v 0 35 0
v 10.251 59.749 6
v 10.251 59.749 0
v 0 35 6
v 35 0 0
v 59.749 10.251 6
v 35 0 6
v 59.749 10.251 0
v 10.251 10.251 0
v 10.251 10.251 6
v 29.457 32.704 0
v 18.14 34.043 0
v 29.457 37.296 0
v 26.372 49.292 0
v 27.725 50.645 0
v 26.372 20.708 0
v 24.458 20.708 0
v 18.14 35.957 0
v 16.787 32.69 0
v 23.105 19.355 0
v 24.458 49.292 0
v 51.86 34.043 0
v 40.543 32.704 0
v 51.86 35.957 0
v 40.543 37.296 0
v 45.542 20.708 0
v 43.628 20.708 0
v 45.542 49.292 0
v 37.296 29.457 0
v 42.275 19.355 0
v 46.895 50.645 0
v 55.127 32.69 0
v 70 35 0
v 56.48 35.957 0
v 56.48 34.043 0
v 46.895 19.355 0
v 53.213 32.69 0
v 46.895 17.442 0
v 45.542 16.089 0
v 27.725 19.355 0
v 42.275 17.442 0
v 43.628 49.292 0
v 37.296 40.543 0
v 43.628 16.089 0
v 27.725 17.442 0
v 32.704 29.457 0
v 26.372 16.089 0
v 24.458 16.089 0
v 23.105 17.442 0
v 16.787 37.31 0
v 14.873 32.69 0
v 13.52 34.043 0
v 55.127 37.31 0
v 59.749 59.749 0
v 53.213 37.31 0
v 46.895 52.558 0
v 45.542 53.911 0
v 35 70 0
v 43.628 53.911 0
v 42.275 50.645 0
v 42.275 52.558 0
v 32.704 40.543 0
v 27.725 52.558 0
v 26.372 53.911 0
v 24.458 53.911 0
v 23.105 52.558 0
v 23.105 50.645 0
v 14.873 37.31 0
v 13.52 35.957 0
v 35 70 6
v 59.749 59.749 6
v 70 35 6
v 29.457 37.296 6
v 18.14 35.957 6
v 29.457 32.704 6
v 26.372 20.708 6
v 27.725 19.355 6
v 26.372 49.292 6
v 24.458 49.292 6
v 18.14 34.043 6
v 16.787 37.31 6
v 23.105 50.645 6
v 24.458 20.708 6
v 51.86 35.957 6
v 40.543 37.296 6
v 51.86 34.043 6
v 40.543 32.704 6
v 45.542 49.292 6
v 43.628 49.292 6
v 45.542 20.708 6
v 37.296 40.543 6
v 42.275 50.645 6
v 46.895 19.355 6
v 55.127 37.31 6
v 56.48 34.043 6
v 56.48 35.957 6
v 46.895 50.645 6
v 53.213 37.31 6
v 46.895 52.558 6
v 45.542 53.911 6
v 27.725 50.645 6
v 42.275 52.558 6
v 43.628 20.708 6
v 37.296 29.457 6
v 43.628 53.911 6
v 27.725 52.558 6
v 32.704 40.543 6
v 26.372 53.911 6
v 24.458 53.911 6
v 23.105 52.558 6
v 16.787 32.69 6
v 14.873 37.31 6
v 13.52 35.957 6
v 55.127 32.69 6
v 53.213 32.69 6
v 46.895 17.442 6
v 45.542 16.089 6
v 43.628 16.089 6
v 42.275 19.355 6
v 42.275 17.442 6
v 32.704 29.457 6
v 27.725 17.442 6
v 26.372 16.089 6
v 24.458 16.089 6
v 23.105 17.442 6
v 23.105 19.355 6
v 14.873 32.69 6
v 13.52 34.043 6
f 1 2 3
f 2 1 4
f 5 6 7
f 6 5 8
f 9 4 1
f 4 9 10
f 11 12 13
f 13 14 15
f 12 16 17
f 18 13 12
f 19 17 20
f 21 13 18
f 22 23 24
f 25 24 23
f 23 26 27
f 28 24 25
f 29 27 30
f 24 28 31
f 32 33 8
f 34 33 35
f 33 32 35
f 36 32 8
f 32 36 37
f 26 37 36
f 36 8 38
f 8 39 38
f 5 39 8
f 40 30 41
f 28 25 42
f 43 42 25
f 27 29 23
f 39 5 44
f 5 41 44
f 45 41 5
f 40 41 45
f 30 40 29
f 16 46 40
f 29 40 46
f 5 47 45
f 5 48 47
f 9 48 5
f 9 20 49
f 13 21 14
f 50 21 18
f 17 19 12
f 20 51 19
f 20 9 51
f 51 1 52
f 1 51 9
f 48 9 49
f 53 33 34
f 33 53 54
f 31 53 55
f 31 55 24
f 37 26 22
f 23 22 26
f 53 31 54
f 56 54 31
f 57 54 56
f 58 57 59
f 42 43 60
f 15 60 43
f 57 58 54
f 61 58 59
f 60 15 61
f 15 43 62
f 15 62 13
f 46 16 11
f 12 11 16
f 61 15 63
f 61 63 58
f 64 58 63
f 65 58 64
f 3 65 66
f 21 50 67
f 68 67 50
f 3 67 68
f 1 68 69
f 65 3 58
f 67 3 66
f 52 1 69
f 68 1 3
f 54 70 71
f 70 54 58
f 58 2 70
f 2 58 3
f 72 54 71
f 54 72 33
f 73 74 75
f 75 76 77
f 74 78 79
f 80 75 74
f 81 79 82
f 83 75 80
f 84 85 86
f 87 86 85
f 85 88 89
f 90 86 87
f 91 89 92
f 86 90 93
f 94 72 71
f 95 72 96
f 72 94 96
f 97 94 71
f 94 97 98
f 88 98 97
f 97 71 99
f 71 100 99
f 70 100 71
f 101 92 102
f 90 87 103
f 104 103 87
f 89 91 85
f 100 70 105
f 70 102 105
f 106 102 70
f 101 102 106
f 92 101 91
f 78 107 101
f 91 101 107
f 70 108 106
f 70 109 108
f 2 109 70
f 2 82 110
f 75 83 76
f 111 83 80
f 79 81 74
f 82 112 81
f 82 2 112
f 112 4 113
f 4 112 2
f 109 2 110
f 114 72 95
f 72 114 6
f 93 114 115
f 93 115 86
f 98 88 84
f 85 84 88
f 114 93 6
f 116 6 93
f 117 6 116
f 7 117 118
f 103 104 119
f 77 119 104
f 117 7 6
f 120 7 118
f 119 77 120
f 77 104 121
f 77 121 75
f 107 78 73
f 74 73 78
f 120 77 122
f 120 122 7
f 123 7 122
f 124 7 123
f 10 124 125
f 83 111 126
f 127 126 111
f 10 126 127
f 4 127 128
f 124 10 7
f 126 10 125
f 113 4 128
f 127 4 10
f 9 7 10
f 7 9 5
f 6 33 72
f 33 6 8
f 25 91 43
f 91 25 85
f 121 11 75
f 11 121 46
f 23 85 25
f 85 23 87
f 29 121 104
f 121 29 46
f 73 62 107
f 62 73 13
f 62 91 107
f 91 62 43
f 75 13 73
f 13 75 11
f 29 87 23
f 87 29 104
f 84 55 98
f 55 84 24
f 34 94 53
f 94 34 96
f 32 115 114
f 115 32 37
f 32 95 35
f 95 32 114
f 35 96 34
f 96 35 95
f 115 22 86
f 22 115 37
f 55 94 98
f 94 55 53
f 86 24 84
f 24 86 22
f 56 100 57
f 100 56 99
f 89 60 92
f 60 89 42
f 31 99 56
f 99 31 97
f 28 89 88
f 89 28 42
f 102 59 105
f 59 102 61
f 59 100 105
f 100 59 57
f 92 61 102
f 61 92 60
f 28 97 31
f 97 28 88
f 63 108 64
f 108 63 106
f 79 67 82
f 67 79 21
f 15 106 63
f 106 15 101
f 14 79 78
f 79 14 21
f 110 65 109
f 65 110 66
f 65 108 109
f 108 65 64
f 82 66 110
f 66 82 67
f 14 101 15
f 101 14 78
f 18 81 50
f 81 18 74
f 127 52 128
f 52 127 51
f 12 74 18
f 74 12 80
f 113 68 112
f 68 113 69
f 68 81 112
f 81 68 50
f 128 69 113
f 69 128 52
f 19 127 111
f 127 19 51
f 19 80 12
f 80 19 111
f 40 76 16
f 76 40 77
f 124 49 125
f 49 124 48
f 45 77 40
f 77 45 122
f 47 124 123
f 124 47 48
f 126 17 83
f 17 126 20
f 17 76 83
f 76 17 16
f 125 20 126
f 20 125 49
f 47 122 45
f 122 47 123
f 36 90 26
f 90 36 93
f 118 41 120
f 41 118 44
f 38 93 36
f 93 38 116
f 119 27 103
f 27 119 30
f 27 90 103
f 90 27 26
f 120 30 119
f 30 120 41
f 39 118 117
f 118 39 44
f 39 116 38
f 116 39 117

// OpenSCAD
$fn = 32;

// ----------------------------------------------------------------------
// Polygon plate: 8-gon R35, 6 bolt windows
// ----------------------------------------------------------------------

// --- parameters (mm) ---
sides = 8;                // number of polygon sides
plate_r = 35;             // circumscribed radius of the polygon
bore_r = 6;               // centre bore radius
bolts = 6;                // number of bolt windows
ring_r = 19.17;           // bolt-circle radius
bolt_r = 2.5;             // bolt window radius
plate_t = 6;              // plate thickness, Z (extrusion height)

plate_d = 2 * plate_r;  // circumscribed diameter
bore_d = 2 * bore_r;  // centre bore diameter
bolt_d = 2 * bolt_r;  // bolt window diameter
ring_d = 2 * ring_r;  // bolt-circle diameter

profile = [[70, 35], [59.749, 59.749], [35, 70], [10.251, 59.749], [0, 35], [10.251, 10.251], [35, 0], [59.749, 10.251]];  // primary outline, 8 points, counter clockwise
void_1 = [[40.543, 37.296], [37.296, 40.543], [32.704, 40.543], [29.457, 37.296], [29.457, 32.704], [32.704, 29.457], [37.296, 29.457], [40.543, 32.704]];  // centre bore, 8 points
void_2 = [[56.48, 35.957], [55.127, 37.31], [53.213, 37.31], [51.86, 35.957], [51.86, 34.043], [53.213, 32.69], [55.127, 32.69], [56.48, 34.043]];  // bolt window 1, 8 points
void_3 = [[46.895, 52.558], [45.542, 53.911], [43.628, 53.911], [42.275, 52.558], [42.275, 50.645], [43.628, 49.292], [45.542, 49.292], [46.895, 50.645]];  // bolt window 2, 8 points
void_4 = [[27.725, 52.558], [26.372, 53.911], [24.458, 53.911], [23.105, 52.558], [23.105, 50.645], [24.458, 49.292], [26.372, 49.292], [27.725, 50.645]];  // bolt window 3, 8 points
void_5 = [[18.14, 35.957], [16.787, 37.31], [14.873, 37.31], [13.52, 35.957], [13.52, 34.043], [14.873, 32.69], [16.787, 32.69], [18.14, 34.043]];  // bolt window 4, 8 points
void_6 = [[27.725, 19.355], [26.372, 20.708], [24.458, 20.708], [23.105, 19.355], [23.105, 17.442], [24.458, 16.089], [26.372, 16.089], [27.725, 17.442]];  // bolt window 5, 8 points
void_7 = [[46.895, 19.355], [45.542, 20.708], [43.628, 20.708], [42.275, 19.355], [42.275, 17.442], [43.628, 16.089], [45.542, 16.089], [46.895, 17.442]];  // bolt window 6, 8 points

// --- the one profile operation ---
difference() {
  linear_extrude(height = plate_t) polygon(points = profile);
  translate([0, 0, -1])
    linear_extrude(height = plate_t + 2) polygon(points = void_1);
  translate([0, 0, -1])
    linear_extrude(height = plate_t + 2) polygon(points = void_2);
  translate([0, 0, -1])
    linear_extrude(height = plate_t + 2) polygon(points = void_3);
  translate([0, 0, -1])
    linear_extrude(height = plate_t + 2) polygon(points = void_4);
  translate([0, 0, -1])
    linear_extrude(height = plate_t + 2) polygon(points = void_5);
  translate([0, 0, -1])
    linear_extrude(height = plate_t + 2) polygon(points = void_6);
  translate([0, 0, -1])
    linear_extrude(height = plate_t + 2) polygon(points = void_7);
}
